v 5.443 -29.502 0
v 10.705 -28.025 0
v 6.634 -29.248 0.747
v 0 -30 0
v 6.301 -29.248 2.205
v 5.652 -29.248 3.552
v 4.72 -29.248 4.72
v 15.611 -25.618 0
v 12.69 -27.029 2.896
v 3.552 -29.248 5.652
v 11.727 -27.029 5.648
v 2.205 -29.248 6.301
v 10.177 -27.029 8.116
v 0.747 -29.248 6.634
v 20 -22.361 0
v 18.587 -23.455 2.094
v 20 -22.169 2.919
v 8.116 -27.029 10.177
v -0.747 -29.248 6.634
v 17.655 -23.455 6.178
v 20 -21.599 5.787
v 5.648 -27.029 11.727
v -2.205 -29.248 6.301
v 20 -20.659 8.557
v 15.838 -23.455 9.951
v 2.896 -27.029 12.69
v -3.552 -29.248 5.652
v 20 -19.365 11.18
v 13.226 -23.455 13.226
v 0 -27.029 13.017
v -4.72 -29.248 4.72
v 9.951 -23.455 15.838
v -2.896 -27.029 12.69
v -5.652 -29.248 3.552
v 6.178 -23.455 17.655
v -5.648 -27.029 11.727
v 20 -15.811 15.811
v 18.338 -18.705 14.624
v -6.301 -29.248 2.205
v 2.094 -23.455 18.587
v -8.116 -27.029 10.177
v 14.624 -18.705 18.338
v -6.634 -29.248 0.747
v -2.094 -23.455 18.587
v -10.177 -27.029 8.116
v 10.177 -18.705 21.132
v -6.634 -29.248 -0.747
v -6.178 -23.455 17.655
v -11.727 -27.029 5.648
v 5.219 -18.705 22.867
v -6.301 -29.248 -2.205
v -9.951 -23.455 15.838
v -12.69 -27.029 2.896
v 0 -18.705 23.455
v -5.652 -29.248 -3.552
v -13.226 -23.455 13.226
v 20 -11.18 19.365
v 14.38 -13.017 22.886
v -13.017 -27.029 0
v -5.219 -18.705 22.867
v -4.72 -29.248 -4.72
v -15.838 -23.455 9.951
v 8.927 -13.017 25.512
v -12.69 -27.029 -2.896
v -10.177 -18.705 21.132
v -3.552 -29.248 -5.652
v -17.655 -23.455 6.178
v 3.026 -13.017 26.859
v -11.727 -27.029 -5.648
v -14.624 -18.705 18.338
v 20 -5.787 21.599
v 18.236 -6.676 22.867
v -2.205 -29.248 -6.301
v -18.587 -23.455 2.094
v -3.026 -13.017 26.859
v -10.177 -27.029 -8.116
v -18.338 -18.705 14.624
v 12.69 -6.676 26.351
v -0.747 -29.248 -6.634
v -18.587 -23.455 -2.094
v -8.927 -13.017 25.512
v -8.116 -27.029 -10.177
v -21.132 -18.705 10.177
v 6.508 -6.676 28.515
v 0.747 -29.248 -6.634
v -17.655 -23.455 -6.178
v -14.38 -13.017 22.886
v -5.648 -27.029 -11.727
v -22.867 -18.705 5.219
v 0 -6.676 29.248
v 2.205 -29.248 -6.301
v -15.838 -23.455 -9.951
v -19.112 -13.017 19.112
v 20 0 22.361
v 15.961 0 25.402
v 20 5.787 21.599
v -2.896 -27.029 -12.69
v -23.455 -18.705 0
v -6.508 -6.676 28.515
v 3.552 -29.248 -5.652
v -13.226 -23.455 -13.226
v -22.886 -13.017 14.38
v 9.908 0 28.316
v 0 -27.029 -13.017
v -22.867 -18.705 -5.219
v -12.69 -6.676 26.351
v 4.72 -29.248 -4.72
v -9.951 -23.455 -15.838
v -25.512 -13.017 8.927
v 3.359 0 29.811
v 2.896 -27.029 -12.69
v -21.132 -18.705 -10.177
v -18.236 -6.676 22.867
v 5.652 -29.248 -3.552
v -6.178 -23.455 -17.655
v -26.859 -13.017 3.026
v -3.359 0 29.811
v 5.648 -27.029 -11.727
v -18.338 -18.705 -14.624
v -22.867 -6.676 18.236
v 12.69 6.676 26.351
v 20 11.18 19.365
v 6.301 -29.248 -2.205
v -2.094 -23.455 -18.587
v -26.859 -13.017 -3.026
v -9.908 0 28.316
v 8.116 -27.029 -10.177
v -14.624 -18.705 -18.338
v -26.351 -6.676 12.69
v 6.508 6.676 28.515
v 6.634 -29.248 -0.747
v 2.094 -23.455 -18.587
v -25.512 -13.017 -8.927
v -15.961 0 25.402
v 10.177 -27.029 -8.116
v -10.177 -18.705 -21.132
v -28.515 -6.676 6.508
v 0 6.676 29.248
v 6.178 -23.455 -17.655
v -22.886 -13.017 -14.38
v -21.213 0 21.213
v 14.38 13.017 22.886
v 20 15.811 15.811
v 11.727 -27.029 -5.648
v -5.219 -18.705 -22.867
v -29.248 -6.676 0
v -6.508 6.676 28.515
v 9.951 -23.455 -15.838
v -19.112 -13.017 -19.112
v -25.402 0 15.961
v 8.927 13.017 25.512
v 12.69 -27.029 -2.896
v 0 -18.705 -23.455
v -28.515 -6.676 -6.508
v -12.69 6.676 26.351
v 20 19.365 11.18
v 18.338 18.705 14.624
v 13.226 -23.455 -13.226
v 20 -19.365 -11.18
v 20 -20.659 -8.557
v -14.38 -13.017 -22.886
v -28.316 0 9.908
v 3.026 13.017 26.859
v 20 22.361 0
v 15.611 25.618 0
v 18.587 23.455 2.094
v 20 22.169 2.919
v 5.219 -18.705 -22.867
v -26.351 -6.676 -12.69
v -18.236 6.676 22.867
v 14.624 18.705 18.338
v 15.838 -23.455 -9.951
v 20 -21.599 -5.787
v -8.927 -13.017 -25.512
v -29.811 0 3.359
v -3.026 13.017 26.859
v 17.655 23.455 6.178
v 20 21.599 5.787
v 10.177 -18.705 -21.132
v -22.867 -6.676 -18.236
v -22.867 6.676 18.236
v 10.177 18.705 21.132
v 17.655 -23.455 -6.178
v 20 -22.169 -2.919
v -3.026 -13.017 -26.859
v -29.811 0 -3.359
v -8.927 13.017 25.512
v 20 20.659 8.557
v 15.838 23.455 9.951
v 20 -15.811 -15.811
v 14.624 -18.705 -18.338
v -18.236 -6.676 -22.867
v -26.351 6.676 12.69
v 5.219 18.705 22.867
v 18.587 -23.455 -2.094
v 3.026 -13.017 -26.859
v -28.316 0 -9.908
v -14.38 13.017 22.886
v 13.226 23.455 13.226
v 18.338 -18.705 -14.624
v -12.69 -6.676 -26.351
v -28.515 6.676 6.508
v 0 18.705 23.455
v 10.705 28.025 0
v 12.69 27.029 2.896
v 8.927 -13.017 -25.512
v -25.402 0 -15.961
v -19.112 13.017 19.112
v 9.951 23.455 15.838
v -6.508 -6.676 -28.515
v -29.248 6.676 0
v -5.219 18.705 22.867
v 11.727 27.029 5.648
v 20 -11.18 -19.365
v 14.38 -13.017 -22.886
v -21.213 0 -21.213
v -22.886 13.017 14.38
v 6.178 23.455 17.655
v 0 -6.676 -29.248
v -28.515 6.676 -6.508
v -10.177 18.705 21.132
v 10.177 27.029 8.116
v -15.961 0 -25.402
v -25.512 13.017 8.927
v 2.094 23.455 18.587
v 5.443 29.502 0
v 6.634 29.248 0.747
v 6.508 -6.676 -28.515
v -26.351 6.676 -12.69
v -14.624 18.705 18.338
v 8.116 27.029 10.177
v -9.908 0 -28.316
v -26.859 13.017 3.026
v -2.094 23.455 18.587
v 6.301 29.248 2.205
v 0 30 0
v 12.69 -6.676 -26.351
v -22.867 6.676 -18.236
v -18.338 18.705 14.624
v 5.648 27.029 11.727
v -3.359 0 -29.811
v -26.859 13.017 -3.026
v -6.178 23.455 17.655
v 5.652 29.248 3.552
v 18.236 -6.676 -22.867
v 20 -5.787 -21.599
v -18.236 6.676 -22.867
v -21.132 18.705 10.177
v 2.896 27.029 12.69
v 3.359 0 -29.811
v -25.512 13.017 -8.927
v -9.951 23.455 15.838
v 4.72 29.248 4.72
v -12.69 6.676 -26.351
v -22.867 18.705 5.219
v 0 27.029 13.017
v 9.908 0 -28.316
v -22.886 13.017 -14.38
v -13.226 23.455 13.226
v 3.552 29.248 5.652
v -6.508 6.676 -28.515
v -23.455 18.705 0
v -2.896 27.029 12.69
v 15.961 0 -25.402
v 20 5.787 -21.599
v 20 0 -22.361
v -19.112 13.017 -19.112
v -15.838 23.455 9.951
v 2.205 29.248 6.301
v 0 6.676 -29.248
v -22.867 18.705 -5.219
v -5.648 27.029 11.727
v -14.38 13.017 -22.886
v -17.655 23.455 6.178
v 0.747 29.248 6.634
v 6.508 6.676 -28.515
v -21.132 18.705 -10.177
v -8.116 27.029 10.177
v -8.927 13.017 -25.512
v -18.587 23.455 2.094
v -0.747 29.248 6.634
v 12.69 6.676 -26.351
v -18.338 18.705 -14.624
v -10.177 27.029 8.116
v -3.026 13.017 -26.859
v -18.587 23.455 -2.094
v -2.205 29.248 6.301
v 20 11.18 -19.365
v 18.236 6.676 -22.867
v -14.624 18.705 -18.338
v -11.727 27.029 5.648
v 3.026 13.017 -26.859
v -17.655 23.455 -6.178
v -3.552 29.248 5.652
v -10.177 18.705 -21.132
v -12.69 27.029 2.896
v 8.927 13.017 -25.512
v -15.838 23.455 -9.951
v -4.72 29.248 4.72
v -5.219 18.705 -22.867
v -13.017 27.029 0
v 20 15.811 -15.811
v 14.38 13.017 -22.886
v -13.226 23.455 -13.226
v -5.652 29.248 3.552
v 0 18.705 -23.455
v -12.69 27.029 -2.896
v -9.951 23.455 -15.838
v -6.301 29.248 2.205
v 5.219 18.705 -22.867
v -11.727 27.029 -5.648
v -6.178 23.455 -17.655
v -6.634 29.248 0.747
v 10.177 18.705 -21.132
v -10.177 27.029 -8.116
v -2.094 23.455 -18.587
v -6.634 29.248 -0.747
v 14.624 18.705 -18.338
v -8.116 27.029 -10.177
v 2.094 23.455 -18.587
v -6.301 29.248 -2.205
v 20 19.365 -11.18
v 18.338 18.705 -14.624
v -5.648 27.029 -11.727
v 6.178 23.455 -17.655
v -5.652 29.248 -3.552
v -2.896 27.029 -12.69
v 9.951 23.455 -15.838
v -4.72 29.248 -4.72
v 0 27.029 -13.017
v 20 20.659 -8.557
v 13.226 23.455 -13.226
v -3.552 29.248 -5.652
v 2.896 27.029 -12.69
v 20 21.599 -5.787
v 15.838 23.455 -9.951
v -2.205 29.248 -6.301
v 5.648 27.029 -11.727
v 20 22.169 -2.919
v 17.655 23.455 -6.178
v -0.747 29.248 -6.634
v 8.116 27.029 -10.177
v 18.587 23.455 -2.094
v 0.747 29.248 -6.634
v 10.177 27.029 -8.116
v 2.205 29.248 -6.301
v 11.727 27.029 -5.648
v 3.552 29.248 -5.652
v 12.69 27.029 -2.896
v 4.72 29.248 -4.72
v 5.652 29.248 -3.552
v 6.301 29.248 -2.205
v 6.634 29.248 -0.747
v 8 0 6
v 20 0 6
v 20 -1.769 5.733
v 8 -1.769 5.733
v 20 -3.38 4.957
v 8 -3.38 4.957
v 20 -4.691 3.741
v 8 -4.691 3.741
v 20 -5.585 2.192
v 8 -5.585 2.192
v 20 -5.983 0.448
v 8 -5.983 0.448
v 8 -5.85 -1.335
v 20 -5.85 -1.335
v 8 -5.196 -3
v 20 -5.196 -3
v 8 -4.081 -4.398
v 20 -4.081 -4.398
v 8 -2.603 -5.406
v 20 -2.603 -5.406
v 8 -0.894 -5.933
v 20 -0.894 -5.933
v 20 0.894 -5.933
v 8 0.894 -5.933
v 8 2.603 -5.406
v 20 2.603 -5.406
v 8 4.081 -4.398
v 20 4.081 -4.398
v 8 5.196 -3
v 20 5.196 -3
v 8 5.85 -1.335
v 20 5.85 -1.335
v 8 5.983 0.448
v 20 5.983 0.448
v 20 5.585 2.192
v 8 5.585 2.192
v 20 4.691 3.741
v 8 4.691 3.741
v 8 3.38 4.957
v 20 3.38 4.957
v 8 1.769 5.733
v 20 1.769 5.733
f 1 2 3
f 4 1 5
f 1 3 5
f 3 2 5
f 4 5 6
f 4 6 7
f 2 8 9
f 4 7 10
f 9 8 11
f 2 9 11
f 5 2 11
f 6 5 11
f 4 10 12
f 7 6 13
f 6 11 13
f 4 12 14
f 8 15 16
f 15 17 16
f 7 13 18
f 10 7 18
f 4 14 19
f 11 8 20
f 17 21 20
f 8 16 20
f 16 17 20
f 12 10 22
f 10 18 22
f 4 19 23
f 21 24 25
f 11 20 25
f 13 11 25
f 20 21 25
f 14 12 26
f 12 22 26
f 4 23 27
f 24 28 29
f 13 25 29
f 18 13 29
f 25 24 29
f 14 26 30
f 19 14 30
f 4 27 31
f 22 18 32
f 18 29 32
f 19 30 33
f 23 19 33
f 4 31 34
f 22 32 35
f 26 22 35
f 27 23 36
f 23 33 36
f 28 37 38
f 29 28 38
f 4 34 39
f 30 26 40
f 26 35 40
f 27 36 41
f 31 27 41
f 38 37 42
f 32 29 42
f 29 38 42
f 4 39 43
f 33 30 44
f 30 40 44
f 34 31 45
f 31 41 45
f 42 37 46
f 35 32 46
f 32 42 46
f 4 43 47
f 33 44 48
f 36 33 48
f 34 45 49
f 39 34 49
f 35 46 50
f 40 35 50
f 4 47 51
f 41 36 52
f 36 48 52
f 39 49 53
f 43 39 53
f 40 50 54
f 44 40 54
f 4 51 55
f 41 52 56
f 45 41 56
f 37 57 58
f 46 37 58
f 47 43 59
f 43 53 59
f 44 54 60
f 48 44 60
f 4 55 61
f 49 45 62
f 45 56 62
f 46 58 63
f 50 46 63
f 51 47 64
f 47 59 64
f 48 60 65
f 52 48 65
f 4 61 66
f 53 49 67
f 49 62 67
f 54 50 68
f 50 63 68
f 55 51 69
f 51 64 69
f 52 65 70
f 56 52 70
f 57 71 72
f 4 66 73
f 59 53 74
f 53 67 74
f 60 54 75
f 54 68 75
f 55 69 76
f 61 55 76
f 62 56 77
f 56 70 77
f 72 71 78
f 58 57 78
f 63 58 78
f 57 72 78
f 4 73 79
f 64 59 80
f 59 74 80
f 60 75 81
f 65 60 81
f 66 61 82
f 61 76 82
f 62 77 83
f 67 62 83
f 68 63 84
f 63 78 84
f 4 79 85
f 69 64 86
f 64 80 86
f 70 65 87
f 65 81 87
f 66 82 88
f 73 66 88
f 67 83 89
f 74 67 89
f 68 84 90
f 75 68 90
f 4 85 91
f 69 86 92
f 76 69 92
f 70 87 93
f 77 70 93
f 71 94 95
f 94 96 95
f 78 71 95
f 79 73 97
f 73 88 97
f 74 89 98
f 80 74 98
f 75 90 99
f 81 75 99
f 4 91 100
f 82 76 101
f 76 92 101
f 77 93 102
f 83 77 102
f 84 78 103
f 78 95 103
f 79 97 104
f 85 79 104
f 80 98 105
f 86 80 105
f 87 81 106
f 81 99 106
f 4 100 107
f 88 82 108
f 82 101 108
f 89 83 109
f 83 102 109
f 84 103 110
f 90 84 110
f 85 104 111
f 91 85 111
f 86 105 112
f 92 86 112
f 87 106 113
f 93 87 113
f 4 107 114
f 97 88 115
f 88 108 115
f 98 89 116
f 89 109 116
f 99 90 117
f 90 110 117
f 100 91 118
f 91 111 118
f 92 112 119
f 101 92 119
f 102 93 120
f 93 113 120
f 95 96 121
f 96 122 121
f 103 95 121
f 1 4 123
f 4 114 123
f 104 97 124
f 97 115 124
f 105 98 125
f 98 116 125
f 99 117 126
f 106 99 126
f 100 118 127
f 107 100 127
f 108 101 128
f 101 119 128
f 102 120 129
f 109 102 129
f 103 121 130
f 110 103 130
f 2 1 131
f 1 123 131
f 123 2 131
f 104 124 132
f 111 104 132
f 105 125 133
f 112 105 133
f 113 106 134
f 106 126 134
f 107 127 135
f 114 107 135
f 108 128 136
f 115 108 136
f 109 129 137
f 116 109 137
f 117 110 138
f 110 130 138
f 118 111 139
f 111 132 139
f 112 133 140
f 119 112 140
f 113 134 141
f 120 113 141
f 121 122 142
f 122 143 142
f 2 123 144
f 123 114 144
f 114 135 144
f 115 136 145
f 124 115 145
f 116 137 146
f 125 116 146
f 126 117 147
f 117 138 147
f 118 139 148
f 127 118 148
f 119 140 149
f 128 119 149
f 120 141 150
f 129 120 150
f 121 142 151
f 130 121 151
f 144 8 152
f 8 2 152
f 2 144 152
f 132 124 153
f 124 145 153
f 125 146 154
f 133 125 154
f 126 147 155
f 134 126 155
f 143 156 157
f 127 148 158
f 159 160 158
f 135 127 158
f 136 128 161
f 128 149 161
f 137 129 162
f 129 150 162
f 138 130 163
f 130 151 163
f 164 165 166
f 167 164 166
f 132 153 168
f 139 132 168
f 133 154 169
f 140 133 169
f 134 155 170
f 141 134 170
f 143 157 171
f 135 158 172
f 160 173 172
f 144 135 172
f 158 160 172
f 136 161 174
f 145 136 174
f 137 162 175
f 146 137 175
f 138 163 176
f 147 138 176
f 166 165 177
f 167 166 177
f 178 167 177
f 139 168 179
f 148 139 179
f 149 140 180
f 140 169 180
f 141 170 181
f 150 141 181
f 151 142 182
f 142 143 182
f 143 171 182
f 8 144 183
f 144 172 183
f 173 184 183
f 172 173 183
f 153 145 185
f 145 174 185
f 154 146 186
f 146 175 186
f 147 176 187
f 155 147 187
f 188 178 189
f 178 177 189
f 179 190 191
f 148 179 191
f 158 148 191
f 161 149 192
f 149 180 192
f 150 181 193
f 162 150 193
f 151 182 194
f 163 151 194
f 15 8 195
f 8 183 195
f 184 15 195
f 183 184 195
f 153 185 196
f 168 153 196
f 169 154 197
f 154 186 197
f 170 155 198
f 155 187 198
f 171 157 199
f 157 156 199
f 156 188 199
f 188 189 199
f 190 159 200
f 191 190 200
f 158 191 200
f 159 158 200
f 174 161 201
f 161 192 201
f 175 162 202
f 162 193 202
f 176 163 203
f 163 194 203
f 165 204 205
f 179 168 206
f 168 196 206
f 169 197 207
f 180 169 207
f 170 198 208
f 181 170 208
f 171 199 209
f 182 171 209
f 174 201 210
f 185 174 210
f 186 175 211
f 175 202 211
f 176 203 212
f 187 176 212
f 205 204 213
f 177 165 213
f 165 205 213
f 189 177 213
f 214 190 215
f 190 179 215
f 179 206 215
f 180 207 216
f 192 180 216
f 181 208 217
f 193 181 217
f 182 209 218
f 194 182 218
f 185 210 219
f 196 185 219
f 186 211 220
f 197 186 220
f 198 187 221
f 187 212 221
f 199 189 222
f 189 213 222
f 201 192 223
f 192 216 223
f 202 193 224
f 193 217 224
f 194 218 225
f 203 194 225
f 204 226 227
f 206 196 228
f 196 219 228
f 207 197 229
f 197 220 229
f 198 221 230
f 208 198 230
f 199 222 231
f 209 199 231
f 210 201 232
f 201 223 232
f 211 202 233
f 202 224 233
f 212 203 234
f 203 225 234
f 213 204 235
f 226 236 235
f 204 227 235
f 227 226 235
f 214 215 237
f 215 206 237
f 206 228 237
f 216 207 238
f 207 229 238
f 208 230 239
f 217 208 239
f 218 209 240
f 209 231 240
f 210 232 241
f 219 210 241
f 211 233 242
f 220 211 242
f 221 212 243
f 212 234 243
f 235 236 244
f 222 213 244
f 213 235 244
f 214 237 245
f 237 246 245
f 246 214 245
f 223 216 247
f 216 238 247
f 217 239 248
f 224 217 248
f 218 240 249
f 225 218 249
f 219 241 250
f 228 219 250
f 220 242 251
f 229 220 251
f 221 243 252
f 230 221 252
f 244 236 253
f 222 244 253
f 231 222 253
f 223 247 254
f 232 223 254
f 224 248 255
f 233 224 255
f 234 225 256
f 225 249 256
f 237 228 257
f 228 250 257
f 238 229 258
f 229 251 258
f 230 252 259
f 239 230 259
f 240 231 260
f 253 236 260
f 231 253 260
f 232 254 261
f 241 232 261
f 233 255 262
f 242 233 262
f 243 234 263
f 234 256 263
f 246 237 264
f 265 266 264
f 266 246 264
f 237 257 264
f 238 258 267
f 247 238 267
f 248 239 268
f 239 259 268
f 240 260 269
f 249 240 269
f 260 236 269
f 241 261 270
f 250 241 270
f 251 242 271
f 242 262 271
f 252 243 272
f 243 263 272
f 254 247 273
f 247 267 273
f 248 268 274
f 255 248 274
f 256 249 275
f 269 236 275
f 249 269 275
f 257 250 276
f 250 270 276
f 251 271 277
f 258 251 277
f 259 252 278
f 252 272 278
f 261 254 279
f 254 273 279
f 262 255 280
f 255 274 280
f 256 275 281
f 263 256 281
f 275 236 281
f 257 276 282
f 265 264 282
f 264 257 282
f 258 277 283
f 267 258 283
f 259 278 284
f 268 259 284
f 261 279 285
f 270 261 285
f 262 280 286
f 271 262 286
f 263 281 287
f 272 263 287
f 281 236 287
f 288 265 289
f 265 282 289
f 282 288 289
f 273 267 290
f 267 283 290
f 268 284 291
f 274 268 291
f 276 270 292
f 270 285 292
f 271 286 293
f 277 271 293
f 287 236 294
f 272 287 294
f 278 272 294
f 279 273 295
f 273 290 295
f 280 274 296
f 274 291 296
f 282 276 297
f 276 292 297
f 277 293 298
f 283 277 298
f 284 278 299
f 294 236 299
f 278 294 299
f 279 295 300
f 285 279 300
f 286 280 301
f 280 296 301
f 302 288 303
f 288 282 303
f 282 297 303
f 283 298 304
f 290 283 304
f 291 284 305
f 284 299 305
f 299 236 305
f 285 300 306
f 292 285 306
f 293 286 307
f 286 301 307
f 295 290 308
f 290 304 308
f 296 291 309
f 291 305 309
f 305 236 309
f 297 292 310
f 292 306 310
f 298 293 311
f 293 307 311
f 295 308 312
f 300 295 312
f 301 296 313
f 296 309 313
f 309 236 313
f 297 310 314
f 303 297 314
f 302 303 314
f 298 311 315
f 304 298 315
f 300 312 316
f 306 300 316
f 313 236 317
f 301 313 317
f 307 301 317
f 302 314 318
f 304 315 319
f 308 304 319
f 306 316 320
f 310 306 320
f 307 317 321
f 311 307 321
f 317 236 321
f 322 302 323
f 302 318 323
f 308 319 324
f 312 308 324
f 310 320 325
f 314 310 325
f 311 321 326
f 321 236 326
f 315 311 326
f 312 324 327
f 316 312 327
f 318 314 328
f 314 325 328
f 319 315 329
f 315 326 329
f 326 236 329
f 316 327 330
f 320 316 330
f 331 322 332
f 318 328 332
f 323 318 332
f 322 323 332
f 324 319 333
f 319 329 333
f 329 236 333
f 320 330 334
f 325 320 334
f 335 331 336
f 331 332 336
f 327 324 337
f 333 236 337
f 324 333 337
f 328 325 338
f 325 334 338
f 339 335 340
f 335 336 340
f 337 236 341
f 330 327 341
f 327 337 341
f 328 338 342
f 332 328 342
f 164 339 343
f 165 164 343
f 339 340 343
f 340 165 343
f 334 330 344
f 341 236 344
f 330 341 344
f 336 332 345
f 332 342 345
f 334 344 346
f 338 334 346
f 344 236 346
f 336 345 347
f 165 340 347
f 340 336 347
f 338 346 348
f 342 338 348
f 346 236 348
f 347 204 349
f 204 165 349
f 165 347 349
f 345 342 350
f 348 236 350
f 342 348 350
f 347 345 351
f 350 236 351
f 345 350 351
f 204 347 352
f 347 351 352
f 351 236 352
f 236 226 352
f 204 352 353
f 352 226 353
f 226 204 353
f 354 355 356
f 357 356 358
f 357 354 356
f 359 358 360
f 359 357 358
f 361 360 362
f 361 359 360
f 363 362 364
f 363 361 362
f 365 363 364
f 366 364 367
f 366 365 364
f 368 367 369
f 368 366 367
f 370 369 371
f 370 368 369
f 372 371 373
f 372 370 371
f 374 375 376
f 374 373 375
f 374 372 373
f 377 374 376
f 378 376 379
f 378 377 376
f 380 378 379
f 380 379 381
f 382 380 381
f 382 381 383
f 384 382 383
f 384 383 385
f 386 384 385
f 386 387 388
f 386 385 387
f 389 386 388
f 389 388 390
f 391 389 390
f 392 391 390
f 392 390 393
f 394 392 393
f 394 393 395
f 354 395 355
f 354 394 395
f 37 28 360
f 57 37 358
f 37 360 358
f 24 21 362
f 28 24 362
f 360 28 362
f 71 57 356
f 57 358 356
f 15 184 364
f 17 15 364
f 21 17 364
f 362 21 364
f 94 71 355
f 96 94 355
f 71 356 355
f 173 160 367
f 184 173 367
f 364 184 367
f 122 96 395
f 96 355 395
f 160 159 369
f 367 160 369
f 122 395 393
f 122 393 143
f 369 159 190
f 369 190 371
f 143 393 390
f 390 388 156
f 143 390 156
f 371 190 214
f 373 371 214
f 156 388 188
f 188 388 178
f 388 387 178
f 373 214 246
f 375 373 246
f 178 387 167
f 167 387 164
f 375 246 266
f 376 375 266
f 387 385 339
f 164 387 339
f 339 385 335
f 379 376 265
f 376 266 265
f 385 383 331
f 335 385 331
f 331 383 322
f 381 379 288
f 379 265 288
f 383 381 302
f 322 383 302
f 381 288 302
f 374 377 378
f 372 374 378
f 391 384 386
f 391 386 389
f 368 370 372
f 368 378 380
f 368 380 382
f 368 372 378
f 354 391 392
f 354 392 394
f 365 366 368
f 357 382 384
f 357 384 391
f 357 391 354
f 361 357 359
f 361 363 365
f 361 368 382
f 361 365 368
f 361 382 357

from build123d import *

# Parameters (mm, degrees)
CUT_EXTRUDE_THIN1_DEPTH      = 52.961524227
CUT_EXTRUDE_THIN1_DEPTH_BACK = 52.961524227
SKETCH2_W                    = 30
SKETCH2_H                    = 44.72135955
CUT_EXTRUDE1_DEPTH           = 66.574385243
CUT_EXTRUDE1_DEPTH_BACK      = 12
SKETCH3_R                    = 6


with BuildPart() as part:
    # Sketch1 → Revolve1 (revolve)
    with BuildSketch(Plane.XY):
        with BuildLine():
            Line((0, 30), (0, -30))
            ThreePointArc((0, -30), (30, 0), (0, 30))
        make_face()
    revolve(axis=Axis((0, 30, 0), (0, -1, 0)))

    # Sketch2 → Cut-Extrude-Thin1 (cut, two sides: drawn at the far end of the back side and taken through both)
    with BuildSketch(Plane.XY.offset(-CUT_EXTRUDE_THIN1_DEPTH_BACK)):
        with Locations((35, 0)):
            Rectangle(SKETCH2_W, SKETCH2_H)
    extrude(amount=CUT_EXTRUDE_THIN1_DEPTH + CUT_EXTRUDE_THIN1_DEPTH_BACK, mode=Mode.SUBTRACT)

    # Sketch3 → Cut-Extrude1 (cut, two sides: drawn at the far end of the back side and taken through both)
    with BuildSketch(Plane(origin=(20, 0, 0), x_dir=(0, 0, -1), z_dir=(1, 0, 0)).offset(-CUT_EXTRUDE1_DEPTH_BACK)):
        with Locations(Location((0, 0, 0), (0, 0, 180))):
            Circle(SKETCH3_R)
    extrude(amount=CUT_EXTRUDE1_DEPTH + CUT_EXTRUDE1_DEPTH_BACK, mode=Mode.SUBTRACT)


solid = part.part
